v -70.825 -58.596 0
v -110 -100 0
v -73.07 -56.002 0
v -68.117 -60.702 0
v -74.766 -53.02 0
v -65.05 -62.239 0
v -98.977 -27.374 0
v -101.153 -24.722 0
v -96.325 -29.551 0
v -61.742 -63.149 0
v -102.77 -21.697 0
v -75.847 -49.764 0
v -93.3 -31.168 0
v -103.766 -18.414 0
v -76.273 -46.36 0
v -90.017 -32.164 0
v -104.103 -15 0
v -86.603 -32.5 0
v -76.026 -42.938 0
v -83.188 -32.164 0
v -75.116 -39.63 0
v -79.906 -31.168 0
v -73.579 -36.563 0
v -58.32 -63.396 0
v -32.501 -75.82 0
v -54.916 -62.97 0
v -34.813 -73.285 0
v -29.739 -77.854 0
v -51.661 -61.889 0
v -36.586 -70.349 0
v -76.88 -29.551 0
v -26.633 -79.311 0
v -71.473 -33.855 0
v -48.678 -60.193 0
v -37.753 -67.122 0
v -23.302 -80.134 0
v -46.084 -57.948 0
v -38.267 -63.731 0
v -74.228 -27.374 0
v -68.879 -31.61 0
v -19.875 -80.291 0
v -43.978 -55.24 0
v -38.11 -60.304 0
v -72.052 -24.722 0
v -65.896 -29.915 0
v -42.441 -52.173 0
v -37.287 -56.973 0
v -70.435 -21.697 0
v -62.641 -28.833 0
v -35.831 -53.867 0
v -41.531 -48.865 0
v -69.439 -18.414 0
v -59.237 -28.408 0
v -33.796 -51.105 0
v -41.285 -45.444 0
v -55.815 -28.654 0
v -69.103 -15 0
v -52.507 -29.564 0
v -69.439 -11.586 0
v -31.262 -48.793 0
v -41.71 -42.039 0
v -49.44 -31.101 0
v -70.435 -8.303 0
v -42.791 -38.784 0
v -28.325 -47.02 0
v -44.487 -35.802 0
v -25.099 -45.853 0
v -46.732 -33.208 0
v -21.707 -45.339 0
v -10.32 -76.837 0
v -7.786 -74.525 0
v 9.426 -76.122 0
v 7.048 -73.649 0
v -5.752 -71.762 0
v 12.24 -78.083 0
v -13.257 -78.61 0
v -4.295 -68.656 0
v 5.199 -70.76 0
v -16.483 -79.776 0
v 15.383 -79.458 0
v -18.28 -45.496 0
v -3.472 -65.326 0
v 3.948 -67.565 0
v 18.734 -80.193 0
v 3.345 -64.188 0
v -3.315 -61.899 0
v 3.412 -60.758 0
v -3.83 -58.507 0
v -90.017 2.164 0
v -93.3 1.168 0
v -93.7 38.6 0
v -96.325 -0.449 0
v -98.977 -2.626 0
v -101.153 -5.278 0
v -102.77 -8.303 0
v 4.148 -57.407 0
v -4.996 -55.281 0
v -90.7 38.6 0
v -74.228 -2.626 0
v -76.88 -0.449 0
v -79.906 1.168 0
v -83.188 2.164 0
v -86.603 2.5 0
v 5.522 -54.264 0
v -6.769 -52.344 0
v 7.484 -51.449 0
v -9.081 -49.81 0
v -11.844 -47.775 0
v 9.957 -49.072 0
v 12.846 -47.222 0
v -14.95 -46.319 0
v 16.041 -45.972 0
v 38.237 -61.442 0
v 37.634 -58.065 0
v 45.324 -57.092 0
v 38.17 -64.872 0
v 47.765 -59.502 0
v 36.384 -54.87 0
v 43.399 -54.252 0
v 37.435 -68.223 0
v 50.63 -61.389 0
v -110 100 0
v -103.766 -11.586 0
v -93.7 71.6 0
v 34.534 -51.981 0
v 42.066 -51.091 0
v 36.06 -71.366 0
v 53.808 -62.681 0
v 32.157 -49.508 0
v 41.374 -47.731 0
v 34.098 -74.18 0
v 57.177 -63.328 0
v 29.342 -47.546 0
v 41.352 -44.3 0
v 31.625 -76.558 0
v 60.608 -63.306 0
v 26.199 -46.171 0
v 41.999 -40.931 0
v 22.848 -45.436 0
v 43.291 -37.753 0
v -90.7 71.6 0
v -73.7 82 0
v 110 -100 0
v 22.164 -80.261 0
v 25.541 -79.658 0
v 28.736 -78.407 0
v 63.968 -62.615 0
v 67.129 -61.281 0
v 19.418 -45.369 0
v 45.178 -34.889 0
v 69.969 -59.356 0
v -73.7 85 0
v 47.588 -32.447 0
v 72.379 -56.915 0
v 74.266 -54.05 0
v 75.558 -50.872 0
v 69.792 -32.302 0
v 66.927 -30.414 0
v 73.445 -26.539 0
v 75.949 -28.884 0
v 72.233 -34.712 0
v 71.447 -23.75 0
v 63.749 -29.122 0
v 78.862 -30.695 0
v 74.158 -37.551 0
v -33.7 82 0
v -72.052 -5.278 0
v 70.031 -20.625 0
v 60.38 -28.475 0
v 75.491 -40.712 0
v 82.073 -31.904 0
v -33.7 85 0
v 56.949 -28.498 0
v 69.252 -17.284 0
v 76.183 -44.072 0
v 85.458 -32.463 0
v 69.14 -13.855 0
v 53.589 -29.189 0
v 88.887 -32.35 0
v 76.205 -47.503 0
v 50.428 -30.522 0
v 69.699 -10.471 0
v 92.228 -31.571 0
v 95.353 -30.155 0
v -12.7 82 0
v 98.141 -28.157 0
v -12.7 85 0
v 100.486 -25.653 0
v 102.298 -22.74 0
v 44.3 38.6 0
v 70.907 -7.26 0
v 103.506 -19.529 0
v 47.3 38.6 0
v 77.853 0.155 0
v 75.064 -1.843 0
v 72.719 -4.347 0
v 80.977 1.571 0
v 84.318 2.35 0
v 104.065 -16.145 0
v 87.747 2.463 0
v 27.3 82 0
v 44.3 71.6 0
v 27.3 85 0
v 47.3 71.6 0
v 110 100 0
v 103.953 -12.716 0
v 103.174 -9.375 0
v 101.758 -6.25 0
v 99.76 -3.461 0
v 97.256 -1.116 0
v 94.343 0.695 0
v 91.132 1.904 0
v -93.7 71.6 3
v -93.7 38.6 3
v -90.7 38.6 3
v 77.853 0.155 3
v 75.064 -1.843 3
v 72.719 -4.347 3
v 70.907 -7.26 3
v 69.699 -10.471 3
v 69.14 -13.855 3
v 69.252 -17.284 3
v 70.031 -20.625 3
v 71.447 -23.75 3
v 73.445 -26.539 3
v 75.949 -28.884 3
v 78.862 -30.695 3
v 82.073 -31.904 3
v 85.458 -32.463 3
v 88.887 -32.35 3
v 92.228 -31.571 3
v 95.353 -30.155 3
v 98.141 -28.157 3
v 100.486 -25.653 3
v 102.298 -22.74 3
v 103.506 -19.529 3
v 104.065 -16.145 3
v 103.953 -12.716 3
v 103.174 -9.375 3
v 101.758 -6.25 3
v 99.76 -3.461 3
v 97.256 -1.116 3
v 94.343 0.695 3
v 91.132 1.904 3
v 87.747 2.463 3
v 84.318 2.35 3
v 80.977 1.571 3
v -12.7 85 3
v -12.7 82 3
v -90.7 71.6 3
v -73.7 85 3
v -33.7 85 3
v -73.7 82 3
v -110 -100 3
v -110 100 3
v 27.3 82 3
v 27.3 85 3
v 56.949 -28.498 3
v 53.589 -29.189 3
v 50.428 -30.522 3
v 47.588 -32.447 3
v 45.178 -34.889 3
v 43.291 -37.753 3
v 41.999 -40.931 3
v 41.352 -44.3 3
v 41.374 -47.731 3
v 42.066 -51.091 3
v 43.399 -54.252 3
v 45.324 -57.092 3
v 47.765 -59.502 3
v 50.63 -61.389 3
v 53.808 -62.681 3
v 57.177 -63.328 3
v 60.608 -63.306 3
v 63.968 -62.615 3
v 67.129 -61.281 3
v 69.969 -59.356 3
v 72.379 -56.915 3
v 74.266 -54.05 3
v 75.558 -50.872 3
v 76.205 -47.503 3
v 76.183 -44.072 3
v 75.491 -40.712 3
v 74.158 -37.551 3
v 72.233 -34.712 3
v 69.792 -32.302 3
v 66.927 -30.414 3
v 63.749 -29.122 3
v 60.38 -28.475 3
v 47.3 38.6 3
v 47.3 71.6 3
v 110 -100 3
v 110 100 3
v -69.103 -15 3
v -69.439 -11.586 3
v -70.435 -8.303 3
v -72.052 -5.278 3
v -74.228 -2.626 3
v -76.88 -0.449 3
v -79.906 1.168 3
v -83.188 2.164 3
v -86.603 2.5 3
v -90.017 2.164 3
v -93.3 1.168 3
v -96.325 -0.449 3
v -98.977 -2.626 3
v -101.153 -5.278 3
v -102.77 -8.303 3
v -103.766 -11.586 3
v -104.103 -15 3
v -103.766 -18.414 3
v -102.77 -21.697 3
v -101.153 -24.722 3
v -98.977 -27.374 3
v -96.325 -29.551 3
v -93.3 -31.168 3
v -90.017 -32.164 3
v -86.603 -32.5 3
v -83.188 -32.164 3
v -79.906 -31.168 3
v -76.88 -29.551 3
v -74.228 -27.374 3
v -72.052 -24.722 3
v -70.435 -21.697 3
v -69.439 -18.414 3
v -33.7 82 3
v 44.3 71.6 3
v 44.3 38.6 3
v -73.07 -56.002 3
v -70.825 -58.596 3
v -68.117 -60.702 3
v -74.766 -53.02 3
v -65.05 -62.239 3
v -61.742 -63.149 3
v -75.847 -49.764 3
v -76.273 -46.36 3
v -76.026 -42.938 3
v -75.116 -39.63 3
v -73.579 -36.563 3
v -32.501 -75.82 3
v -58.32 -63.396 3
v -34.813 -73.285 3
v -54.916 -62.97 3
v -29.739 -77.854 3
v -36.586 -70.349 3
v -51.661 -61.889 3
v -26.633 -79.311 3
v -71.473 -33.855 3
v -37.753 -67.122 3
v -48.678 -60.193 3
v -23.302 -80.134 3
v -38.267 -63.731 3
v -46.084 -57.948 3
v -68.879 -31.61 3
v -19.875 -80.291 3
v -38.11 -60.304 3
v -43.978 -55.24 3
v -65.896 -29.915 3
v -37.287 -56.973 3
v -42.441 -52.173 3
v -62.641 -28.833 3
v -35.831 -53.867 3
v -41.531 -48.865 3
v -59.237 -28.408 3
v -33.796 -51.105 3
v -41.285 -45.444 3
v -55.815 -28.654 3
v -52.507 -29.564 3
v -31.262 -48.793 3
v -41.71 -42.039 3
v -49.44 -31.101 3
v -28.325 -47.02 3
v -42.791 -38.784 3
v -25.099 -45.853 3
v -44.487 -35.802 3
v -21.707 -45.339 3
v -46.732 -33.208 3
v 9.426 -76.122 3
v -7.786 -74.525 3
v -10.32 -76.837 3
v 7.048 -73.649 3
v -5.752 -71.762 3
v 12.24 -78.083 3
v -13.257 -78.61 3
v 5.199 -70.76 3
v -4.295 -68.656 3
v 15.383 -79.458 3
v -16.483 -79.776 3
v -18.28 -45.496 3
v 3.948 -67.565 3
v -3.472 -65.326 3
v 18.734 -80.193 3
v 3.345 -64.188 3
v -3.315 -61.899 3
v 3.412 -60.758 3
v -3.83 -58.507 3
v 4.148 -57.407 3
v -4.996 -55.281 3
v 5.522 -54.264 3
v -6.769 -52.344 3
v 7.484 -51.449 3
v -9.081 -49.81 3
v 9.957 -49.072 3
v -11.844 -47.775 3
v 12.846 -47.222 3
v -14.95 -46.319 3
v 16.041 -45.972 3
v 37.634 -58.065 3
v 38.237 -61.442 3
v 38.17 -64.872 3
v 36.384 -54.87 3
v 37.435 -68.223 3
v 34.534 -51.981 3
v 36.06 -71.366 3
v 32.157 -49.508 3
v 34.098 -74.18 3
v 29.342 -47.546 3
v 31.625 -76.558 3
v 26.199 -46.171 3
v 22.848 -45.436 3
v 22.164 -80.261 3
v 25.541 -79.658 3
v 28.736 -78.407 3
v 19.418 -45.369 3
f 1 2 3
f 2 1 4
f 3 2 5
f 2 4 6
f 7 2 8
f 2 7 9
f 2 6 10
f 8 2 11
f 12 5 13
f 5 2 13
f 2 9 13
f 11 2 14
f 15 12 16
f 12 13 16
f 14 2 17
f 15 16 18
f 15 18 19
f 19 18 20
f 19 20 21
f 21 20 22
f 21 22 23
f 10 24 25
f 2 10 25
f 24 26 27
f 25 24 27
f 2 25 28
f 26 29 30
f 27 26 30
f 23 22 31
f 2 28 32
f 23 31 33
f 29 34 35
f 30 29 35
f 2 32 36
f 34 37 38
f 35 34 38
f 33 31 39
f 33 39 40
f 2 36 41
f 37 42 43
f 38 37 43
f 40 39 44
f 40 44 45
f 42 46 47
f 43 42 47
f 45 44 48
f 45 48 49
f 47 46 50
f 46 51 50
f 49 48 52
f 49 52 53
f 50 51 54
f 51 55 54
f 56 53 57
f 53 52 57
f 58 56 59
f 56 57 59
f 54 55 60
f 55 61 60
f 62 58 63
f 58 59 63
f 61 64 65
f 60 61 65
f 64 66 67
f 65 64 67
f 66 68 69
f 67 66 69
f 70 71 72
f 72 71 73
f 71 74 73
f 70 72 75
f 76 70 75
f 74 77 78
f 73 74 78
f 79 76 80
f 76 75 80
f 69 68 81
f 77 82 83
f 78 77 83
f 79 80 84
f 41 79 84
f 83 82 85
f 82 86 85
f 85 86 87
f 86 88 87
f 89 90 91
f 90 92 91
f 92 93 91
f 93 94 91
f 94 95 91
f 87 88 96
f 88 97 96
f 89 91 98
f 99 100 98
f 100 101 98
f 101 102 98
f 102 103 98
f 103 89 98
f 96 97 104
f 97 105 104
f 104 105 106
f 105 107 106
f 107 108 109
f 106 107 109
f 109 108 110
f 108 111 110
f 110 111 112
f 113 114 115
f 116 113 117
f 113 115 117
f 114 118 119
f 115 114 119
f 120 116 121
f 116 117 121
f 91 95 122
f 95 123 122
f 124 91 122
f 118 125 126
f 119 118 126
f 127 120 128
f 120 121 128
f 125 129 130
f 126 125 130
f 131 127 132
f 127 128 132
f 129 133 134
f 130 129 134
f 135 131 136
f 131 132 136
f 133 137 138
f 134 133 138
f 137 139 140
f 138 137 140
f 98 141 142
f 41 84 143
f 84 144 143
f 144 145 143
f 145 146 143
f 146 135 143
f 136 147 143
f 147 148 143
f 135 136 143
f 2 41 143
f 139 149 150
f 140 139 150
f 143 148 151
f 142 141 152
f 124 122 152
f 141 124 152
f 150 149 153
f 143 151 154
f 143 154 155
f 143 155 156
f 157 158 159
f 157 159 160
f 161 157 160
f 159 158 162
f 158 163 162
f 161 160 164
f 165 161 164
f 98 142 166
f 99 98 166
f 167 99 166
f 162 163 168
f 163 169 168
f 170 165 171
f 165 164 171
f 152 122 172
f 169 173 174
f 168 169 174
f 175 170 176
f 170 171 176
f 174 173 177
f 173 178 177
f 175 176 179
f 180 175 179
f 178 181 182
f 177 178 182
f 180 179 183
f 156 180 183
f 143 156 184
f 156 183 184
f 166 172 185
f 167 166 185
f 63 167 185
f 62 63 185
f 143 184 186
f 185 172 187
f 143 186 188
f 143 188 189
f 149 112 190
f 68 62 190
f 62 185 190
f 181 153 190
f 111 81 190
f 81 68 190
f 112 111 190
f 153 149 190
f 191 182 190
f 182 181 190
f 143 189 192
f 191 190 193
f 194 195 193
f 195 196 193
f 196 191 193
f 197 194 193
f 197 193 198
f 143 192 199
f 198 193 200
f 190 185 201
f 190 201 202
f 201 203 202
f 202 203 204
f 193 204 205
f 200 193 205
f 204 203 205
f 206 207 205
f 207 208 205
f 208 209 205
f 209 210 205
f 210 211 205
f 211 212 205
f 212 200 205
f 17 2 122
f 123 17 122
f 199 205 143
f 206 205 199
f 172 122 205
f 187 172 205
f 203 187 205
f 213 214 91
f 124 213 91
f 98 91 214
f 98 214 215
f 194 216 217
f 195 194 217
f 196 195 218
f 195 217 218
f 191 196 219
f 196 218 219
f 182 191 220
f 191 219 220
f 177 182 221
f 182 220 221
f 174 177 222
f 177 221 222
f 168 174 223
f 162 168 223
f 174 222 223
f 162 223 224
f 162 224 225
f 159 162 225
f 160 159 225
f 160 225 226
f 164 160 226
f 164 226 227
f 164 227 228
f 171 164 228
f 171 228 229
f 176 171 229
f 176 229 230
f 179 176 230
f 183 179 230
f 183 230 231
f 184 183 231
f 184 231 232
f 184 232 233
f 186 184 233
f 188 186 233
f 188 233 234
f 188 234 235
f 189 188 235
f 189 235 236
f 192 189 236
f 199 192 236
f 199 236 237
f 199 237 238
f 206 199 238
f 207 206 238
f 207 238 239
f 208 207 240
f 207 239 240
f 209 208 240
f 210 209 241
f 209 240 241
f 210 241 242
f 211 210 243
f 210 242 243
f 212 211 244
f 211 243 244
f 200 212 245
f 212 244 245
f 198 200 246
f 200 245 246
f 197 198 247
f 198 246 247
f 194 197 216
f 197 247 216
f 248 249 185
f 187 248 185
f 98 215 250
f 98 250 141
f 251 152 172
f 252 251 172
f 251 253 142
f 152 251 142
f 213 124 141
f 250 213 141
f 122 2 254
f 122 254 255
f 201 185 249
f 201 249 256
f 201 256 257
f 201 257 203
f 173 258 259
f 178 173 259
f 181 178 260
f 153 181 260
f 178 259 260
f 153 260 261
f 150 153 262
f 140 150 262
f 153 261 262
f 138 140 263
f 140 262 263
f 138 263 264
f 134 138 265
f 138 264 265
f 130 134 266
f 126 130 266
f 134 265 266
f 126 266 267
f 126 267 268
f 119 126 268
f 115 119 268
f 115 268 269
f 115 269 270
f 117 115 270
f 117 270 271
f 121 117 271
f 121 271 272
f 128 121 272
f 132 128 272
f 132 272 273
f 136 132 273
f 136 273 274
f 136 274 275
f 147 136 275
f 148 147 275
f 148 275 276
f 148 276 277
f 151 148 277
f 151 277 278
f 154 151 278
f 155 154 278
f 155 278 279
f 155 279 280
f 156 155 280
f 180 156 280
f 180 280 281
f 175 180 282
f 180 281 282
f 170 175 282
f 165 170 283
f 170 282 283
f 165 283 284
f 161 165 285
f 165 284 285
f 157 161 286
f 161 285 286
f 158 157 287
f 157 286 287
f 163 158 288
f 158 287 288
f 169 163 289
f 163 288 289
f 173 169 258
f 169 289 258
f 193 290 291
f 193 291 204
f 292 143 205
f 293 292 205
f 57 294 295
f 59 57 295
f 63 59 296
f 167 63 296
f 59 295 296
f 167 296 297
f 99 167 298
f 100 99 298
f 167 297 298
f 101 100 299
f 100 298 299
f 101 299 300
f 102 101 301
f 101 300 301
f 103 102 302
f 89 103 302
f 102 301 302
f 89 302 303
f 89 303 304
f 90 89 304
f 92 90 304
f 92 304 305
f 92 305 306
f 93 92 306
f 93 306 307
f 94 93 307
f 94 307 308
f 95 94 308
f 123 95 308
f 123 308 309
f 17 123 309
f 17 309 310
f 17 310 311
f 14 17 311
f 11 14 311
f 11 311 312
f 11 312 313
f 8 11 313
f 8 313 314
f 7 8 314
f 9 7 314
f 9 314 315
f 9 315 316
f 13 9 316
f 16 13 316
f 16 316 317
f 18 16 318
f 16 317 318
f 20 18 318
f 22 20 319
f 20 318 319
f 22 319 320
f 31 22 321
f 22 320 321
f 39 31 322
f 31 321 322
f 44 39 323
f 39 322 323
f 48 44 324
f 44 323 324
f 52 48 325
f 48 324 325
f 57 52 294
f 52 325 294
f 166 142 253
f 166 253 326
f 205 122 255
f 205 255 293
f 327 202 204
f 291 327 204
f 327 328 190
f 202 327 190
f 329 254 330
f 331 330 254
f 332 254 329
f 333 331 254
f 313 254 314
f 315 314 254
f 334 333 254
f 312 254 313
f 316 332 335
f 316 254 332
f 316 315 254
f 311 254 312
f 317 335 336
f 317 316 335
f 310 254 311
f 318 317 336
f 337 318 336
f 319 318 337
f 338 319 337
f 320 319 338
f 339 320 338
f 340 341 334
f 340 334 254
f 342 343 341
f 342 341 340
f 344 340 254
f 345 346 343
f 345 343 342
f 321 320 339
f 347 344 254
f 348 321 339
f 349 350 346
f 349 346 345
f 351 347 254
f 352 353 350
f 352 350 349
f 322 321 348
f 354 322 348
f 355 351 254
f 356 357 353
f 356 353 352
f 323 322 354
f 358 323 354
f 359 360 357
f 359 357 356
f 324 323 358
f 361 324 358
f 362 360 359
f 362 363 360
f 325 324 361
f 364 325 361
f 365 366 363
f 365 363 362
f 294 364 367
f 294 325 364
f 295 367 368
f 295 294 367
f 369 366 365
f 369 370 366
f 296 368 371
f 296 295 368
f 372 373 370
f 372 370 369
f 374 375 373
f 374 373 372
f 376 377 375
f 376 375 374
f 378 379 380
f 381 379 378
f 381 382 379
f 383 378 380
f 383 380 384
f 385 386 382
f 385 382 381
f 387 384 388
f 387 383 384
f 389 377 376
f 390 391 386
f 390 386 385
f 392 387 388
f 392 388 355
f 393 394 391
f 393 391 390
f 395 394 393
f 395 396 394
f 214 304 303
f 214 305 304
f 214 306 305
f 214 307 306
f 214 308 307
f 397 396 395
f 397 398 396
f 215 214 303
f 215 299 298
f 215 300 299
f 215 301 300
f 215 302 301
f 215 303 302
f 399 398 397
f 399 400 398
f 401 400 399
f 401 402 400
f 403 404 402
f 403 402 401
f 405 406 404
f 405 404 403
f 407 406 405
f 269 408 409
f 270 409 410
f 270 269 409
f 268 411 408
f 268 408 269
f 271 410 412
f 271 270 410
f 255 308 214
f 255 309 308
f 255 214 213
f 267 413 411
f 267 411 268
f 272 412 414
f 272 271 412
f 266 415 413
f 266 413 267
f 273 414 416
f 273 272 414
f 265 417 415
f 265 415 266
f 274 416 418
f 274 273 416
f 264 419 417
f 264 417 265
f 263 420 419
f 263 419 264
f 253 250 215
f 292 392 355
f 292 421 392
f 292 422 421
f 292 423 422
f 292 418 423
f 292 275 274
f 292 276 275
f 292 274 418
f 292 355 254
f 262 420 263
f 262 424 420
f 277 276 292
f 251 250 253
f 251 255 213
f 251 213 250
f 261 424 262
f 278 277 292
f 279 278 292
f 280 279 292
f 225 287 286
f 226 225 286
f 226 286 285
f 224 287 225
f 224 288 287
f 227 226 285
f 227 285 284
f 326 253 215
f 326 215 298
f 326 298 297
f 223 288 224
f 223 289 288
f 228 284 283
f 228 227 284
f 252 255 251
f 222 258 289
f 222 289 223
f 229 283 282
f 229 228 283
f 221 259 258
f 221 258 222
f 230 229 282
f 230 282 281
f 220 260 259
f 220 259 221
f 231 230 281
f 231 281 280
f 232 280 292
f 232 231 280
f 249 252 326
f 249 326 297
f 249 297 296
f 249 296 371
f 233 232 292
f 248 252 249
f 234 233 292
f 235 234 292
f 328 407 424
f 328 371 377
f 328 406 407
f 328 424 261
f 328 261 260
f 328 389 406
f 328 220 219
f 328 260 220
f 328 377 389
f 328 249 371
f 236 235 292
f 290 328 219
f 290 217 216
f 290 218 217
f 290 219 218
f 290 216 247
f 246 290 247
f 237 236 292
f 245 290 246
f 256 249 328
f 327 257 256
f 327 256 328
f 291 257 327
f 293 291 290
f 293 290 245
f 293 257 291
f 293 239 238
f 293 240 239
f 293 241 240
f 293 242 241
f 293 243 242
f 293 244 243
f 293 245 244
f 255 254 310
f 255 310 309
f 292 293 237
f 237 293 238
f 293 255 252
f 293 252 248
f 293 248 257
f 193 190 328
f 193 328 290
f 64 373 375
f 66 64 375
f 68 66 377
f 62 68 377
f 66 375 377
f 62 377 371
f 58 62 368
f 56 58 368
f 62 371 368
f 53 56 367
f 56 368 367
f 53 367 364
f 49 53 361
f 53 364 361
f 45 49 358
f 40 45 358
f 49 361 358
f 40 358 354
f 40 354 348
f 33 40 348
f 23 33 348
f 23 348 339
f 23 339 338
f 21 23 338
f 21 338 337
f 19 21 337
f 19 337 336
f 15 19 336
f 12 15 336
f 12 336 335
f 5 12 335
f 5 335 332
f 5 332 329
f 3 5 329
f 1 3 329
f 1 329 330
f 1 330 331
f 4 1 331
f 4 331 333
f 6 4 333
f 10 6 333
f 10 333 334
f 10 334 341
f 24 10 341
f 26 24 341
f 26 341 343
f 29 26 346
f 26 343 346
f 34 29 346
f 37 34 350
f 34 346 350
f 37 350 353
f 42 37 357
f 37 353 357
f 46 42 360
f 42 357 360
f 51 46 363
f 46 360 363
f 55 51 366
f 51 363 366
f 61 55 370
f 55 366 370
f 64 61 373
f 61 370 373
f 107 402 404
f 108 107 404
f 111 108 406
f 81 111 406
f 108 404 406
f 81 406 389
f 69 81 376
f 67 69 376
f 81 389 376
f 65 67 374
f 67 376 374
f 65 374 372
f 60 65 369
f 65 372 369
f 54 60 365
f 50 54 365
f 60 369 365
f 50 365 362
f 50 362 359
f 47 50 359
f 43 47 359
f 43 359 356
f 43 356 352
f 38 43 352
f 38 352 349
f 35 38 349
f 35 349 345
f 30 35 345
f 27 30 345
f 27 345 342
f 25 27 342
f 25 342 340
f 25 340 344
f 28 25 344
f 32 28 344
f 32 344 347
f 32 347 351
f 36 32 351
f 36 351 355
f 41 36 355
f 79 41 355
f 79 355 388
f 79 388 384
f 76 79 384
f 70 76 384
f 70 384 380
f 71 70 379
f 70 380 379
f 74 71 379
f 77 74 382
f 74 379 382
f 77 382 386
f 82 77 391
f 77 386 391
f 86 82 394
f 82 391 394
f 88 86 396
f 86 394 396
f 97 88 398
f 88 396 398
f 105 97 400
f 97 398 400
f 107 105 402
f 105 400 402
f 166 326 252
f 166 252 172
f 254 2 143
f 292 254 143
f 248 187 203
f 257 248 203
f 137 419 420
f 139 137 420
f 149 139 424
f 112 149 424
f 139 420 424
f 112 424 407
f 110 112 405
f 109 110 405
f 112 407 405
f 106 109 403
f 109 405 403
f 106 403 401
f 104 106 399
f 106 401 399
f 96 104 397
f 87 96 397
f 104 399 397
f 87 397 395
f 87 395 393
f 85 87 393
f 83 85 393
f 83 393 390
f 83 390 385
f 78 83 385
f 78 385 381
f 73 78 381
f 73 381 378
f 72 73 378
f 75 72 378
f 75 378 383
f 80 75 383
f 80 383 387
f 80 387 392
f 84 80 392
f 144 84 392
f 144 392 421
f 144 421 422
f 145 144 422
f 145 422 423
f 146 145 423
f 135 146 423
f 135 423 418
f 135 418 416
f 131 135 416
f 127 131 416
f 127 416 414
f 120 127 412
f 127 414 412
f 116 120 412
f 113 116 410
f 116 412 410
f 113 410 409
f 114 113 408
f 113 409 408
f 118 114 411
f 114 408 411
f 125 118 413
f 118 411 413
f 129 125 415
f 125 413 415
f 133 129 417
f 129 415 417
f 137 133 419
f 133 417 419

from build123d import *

# Parameters (mm, degrees)
ESQUISSE1_W                  = 220
ESQUISSE1_H                  = 200
BOSS_EXTRU_1_DEPTH           = 3
ESQUISSE2_R                  = 17.5
ENL_V_MAT_EXTRU_1_DEPTH      = 149.690954668
R_P_TITION_CIRCULAIRE1_COUNT = 6
R_P_TITION_CIRCULAIRE1_ANGLE = 120
EMPREINTE1_START             = 82
EMPREINTE1_OUTLINE_W         = 40
EMPREINTE1_OUTLINE_H         = 3
EMPREINTE1_DEPTH             = 3
EMPREINTE1_START_2           = 38.6
EMPREINTE1_2_OUTLINE_W       = 3
EMPREINTE1_2_OUTLINE_H       = 3
EMPREINTE1_2_DEPTH           = 33


# Read off the part's stored shape, not the designer's step: Empreinte1
with BuildPart() as part:
    # Esquisse1 → Boss.-Extru.1 (new body)
    with BuildSketch(Plane.XY):
        Rectangle(ESQUISSE1_W, ESQUISSE1_H)
    extrude(amount=BOSS_EXTRU_1_DEPTH)

    # Esquisse2 → Enlèv. mat.-Extru.1 (cut, through all)
    with BuildSketch(Plane.XY.offset(3)):
        with Locations((-86.602540378, -15)):
            Circle(ESQUISSE2_R)
    enl_v_mat_extru_1 = extrude(amount=-ENL_V_MAT_EXTRU_1_DEPTH, mode=Mode.SUBTRACT)

    # Répétition circulaire1: Enlèv. mat.-Extru.1 ×6 about axis
    r_p_tition_circulaire1_axis = Axis((0, 35, 0), (0, 0, 1))
    for i in range(1, R_P_TITION_CIRCULAIRE1_COUNT):
        add(enl_v_mat_extru_1.rotate(r_p_tition_circulaire1_axis, i * R_P_TITION_CIRCULAIRE1_ANGLE / (R_P_TITION_CIRCULAIRE1_COUNT - 1)), mode=Mode.SUBTRACT)

    # Empreinte1 outline → Empreinte1 (cut)
    with BuildSketch(Plane(origin=(0, 0, 0), x_dir=(1, 0, 0), z_dir=(0, 1, 0)).offset(EMPREINTE1_START)):
        with Locations((-53.7, -1.5)):
            Rectangle(EMPREINTE1_OUTLINE_W, EMPREINTE1_OUTLINE_H)
        with Locations((7.3, -1.5)):
            Rectangle(EMPREINTE1_OUTLINE_W, EMPREINTE1_OUTLINE_H)
    extrude(amount=EMPREINTE1_DEPTH, mode=Mode.SUBTRACT)

    # Empreinte1 2 outline → Empreinte1 2 (cut)
    with BuildSketch(Plane(origin=(0, 0, 0), x_dir=(1, 0, 0), z_dir=(0, 1, 0)).offset(EMPREINTE1_START_2)):
        with Locations((-92.2, -1.5)):
            Rectangle(EMPREINTE1_2_OUTLINE_W, EMPREINTE1_2_OUTLINE_H)
        with Locations((45.8, -1.5)):
            Rectangle(EMPREINTE1_2_OUTLINE_W, EMPREINTE1_2_OUTLINE_H)
    extrude(amount=EMPREINTE1_2_DEPTH, mode=Mode.SUBTRACT)


solid = part.part
